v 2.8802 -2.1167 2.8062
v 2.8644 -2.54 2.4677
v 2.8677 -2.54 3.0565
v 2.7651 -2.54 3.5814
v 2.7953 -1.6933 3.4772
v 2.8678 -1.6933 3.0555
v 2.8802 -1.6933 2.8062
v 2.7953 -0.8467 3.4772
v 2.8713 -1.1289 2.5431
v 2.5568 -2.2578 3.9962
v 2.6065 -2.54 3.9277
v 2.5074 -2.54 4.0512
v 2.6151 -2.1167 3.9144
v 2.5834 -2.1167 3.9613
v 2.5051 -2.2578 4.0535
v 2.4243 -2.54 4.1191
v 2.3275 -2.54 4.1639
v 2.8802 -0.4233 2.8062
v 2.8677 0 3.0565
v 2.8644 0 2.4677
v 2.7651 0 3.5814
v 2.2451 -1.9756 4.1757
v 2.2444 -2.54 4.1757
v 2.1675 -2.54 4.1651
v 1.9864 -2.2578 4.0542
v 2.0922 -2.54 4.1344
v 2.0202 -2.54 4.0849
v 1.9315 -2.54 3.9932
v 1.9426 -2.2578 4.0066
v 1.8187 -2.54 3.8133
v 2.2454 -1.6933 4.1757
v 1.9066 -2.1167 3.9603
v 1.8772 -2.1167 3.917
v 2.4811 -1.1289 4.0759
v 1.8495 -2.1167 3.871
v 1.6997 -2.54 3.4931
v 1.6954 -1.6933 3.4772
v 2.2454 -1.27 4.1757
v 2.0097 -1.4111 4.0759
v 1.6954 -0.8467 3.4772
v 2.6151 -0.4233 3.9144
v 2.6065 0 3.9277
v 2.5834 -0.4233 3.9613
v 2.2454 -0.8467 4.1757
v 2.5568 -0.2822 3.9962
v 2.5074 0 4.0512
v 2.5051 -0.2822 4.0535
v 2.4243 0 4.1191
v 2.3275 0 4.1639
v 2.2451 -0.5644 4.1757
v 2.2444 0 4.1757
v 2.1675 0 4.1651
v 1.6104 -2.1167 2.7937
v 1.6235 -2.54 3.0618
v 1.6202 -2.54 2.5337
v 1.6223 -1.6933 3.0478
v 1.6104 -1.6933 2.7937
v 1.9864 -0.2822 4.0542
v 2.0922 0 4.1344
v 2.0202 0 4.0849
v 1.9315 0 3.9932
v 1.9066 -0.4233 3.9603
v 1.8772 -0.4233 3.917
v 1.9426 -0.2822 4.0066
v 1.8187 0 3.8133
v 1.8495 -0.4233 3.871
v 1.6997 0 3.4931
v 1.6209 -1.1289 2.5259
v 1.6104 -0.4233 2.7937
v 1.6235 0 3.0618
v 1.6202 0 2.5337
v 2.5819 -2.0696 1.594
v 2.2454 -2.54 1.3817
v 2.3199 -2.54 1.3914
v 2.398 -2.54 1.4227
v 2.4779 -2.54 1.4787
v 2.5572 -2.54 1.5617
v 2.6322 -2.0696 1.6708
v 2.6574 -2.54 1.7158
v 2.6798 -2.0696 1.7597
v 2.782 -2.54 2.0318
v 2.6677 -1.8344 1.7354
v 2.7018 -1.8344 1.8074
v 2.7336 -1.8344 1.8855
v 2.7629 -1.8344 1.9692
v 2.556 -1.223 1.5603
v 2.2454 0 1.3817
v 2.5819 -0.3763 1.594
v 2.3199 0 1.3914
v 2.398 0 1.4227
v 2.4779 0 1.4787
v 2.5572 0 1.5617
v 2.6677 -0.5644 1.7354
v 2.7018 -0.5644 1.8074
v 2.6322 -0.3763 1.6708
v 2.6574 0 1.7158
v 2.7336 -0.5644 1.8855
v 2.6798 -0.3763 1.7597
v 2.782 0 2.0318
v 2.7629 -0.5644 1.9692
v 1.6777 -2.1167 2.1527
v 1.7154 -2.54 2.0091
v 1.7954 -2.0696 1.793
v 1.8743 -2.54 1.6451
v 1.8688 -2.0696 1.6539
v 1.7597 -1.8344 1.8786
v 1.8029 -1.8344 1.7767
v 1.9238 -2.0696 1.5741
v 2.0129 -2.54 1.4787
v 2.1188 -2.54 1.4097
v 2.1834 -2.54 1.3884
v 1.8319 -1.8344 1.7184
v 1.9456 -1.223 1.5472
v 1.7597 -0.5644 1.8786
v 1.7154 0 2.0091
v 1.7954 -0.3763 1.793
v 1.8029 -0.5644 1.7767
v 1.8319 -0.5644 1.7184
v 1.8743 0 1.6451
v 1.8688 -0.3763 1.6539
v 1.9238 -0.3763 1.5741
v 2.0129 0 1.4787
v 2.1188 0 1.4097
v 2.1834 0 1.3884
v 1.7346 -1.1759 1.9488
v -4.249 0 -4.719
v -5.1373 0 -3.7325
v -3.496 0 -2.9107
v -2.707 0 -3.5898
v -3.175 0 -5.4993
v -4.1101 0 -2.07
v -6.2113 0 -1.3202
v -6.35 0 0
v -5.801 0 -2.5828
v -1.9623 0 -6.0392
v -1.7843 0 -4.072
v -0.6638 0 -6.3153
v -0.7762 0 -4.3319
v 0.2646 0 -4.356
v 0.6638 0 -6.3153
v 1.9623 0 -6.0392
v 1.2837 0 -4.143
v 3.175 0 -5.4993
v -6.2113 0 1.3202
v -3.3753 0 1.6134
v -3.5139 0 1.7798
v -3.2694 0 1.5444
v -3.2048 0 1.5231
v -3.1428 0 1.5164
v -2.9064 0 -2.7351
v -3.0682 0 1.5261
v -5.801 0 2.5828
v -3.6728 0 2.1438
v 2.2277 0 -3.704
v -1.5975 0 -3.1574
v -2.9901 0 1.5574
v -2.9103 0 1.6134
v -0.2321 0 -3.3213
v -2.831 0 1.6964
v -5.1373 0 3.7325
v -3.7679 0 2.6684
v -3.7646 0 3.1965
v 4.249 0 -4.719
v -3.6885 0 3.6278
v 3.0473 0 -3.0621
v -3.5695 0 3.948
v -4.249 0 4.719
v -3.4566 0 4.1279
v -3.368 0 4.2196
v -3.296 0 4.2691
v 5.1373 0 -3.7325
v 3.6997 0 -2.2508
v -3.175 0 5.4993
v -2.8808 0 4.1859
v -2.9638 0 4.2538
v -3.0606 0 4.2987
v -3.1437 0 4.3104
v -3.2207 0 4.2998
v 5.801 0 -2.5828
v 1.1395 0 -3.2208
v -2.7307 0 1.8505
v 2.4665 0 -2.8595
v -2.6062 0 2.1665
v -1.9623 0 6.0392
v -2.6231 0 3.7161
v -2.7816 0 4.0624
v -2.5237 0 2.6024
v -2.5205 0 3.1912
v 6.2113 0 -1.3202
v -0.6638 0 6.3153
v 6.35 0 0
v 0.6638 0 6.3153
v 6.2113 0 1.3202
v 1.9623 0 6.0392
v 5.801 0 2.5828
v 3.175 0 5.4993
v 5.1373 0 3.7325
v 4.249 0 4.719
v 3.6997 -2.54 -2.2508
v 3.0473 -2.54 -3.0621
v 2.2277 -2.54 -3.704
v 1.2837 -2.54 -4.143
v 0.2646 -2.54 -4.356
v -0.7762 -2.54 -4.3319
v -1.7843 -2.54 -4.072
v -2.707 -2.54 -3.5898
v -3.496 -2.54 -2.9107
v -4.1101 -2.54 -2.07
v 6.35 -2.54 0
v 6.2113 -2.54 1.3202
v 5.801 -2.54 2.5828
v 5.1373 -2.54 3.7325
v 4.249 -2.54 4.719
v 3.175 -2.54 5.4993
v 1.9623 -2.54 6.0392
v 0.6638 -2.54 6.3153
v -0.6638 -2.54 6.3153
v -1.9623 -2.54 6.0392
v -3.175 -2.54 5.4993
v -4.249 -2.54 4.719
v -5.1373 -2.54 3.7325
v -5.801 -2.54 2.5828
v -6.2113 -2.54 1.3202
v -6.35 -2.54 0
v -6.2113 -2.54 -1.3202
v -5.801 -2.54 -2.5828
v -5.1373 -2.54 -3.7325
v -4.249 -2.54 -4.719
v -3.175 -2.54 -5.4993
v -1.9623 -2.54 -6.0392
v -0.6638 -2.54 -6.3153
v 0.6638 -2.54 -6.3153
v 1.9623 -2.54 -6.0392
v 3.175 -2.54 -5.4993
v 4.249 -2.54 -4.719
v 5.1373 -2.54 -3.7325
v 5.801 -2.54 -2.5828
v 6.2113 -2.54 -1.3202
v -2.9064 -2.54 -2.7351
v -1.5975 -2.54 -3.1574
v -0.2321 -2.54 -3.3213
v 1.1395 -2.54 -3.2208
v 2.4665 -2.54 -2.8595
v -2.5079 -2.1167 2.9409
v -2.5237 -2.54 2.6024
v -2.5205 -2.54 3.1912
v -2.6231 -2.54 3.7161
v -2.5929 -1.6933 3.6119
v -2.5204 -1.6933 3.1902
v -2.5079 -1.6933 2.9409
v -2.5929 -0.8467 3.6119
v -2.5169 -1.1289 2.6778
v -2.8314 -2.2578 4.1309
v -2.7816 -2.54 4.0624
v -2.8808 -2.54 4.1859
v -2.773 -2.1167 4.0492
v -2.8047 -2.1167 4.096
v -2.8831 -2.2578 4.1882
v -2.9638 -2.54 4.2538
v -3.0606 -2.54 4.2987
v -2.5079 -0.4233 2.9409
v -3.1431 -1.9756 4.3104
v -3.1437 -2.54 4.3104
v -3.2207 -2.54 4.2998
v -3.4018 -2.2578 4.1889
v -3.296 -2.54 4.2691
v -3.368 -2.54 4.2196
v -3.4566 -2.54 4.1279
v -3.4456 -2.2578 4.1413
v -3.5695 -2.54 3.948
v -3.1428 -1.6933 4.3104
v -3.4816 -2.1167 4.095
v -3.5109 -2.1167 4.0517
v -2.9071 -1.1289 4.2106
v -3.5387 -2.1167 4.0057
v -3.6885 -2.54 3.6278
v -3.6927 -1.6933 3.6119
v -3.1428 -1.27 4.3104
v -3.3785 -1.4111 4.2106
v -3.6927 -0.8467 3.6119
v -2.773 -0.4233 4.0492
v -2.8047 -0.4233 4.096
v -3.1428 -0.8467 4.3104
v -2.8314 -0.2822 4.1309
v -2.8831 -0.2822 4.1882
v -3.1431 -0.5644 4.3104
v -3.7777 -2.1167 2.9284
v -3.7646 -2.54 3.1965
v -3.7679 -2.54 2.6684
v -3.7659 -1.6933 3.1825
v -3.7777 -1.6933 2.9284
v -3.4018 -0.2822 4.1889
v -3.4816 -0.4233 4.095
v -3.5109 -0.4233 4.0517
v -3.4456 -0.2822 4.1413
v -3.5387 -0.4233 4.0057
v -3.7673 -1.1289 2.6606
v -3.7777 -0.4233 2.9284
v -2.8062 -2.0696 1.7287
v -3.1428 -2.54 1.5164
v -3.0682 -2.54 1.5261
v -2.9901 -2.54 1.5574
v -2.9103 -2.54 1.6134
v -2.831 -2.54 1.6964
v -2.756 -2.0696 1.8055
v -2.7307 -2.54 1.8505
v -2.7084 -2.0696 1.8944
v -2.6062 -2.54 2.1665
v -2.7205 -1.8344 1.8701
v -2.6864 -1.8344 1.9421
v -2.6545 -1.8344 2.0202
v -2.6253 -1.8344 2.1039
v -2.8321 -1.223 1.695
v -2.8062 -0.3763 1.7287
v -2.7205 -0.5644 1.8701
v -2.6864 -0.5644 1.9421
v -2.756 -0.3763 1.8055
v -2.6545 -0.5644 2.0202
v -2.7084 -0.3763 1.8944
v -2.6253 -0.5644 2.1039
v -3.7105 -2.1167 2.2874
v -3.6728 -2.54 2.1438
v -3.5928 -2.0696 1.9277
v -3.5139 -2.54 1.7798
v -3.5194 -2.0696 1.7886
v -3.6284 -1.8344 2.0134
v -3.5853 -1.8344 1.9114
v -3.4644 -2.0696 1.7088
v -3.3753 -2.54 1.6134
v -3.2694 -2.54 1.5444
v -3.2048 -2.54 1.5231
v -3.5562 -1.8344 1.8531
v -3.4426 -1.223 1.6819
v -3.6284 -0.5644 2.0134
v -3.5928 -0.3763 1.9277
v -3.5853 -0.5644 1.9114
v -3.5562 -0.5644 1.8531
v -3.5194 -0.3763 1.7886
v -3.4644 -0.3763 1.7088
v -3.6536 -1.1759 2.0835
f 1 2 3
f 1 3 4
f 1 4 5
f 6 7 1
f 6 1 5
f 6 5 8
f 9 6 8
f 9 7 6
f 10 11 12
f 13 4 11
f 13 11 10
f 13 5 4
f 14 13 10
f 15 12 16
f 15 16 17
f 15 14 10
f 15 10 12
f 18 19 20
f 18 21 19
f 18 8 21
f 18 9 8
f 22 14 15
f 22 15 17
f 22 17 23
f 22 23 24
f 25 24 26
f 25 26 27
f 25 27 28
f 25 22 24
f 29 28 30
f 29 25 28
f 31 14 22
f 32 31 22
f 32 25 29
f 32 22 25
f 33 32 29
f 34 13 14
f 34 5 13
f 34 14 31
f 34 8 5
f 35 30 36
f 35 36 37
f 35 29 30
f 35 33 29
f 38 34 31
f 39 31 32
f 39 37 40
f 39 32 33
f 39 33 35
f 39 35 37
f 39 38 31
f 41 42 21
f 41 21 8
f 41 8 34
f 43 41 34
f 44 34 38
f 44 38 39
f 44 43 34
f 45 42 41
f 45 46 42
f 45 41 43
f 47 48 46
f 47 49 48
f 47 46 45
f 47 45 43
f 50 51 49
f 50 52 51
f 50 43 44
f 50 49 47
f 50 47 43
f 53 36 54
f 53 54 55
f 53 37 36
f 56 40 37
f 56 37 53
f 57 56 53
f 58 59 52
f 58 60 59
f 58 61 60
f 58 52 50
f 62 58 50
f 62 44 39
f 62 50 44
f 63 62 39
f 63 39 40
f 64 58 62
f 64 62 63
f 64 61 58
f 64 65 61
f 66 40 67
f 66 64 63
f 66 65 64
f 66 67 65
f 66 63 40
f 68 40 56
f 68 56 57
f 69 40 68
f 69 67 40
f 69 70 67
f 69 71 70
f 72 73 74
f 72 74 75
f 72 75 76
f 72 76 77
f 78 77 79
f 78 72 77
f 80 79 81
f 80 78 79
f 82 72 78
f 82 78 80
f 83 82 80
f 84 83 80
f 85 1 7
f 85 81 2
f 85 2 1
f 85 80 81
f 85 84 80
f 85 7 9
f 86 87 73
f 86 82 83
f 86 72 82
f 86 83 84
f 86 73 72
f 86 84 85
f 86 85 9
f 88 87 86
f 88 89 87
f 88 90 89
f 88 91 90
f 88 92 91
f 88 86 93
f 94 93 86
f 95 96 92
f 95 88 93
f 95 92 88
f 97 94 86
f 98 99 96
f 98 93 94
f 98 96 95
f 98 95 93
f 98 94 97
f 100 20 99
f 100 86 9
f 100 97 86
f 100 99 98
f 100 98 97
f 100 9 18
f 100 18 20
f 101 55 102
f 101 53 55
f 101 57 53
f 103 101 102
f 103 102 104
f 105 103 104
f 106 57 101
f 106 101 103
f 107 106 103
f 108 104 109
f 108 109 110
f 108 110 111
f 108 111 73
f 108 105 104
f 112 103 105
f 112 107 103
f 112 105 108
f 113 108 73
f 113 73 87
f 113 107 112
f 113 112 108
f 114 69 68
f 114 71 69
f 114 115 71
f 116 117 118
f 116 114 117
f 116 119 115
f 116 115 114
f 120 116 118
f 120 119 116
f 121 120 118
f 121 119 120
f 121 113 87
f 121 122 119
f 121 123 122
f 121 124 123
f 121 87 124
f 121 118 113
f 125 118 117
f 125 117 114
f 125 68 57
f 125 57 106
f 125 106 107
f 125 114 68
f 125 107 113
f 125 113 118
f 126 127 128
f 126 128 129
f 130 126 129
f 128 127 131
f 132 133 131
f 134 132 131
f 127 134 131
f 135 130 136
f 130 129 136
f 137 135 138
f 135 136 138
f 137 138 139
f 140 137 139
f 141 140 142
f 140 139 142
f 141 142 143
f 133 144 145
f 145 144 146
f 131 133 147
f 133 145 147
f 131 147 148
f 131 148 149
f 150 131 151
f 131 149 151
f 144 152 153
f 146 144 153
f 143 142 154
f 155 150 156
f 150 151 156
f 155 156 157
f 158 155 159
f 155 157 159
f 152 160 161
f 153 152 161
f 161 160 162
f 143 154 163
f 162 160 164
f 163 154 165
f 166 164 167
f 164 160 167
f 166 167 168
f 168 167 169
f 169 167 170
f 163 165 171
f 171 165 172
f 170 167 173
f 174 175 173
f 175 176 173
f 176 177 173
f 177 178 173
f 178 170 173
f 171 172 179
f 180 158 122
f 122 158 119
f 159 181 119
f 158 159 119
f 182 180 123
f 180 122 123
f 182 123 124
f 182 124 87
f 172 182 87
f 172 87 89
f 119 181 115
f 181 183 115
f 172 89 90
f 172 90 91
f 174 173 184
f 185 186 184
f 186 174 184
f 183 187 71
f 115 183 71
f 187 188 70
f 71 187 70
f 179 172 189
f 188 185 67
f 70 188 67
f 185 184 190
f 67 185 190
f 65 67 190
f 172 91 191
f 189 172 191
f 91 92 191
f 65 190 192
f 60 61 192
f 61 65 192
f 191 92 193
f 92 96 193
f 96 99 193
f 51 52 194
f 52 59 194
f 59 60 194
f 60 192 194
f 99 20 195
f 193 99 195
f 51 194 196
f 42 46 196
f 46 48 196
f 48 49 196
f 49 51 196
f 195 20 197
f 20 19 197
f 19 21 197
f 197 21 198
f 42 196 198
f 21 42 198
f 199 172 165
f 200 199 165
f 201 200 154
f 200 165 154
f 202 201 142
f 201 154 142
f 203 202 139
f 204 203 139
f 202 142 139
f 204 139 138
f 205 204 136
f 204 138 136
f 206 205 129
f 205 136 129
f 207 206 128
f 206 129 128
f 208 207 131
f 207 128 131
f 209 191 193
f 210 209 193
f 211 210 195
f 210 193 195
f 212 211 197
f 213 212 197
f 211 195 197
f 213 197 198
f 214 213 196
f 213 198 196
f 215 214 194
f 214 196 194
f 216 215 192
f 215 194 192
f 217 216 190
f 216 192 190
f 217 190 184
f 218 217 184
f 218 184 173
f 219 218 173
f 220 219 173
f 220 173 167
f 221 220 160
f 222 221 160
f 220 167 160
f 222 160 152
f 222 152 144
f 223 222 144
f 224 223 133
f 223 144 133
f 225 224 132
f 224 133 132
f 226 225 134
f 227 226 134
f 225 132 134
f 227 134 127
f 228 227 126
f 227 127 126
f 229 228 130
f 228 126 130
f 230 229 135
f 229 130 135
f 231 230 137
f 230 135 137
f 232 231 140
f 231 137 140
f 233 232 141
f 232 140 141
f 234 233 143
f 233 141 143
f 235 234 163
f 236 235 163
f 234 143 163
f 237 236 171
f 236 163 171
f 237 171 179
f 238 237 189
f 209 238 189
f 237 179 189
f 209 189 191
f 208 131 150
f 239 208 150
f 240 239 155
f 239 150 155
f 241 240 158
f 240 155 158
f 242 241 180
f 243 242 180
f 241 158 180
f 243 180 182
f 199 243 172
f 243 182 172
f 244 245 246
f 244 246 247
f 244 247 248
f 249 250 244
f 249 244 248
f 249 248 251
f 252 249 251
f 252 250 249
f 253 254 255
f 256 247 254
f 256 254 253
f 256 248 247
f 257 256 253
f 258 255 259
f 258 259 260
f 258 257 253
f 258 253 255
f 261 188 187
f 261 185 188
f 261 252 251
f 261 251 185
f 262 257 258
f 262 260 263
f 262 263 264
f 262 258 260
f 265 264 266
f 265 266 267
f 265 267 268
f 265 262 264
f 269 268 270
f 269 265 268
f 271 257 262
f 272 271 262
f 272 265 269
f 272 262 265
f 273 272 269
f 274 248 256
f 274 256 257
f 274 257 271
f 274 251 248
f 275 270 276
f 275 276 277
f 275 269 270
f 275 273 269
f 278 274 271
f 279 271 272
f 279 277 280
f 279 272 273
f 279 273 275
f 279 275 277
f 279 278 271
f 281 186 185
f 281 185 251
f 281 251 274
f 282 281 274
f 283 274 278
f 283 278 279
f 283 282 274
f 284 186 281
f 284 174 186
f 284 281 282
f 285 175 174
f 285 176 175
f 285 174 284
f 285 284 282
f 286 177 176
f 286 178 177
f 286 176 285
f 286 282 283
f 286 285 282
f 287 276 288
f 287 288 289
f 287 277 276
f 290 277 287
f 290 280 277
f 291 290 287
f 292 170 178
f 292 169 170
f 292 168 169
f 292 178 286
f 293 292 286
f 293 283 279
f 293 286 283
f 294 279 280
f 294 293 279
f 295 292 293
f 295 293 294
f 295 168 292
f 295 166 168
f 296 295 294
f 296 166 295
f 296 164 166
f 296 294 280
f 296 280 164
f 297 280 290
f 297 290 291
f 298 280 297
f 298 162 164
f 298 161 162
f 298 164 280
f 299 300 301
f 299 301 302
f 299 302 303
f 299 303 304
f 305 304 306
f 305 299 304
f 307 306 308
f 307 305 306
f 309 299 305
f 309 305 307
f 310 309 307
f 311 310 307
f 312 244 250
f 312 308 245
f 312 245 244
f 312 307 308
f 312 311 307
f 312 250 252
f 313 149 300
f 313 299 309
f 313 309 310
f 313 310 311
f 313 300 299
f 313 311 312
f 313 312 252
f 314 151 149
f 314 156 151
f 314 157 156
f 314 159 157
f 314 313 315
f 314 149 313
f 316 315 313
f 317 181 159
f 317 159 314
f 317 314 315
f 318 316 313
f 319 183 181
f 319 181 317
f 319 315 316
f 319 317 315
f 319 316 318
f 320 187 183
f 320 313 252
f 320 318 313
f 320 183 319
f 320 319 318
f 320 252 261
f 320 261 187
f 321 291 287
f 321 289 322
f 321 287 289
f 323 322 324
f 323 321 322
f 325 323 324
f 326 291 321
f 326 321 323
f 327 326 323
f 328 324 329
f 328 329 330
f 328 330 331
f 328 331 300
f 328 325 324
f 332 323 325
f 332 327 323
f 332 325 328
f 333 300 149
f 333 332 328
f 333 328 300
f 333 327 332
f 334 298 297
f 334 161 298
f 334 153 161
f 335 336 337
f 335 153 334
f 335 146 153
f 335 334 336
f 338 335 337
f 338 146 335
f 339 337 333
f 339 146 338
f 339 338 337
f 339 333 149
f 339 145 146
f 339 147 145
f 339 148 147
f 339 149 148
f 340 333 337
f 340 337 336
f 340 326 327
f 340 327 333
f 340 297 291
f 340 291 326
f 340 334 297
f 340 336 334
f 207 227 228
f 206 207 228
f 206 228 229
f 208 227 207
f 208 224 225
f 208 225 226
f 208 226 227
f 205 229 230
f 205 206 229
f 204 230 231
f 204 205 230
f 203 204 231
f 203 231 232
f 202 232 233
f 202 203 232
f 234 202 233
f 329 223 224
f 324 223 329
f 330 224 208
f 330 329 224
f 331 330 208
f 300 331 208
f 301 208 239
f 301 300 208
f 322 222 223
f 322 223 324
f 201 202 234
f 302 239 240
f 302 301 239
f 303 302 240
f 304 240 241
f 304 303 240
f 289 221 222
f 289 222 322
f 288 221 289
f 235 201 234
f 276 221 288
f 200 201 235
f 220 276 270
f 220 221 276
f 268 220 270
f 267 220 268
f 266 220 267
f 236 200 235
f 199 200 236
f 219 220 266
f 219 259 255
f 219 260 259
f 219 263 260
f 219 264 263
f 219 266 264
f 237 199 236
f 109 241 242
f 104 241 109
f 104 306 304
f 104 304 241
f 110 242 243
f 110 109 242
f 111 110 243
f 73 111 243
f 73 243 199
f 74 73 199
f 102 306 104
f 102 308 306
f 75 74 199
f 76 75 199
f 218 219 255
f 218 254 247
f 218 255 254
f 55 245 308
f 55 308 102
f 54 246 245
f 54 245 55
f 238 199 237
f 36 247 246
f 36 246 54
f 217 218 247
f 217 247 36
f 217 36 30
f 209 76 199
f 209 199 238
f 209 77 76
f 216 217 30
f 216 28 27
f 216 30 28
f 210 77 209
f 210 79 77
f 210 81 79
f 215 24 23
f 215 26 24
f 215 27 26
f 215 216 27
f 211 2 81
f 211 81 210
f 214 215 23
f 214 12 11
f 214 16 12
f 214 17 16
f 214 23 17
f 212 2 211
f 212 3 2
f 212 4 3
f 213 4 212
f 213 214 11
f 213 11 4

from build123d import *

# Parameters (mm, degrees)
F0_R     = 6.350037
F1_DEPTH = 2.54


with BuildPart() as f1:
    # F0 (on Front) → F1 (new body)
    with BuildSketch(Plane.XZ):
        Circle(F0_R)
        with BuildLine():
            ThreePointArc((3.6997, -2.250772), (-0.256442, -4.373777), (-4.110112, -2.069989))
            ThreePointArc((-4.110112, -2.069989), (-0.23208, -3.321333), (3.6997, -2.250772))
        make_face(mode=Mode.SUBTRACT)
        with BuildLine():
            add(Edge.make_bspline(
                [(-3.142784, 1.516398), (-2.042932, 1.516398), (-2.592858, 3.611898), (-3.142784, 5.707398), (-3.69271, 3.611898), (-4.242636, 1.516398), (-3.142784, 1.516398)],
                knots=[0, 0, 0, 2.094395, 2.094395, 4.18879, 4.18879, 6.283185, 6.283185, 6.283185], degree=2, weights=[1, 0.5, 1, 0.5, 1, 0.5, 1]))
        make_face(mode=Mode.SUBTRACT)
        with BuildLine():
            add(Edge.make_bspline(
                [(2.24537, 1.381694), (3.345222, 1.381694), (2.795296, 3.477194), (2.24537, 5.572694), (1.695444, 3.477194), (1.145518, 1.381694), (2.24537, 1.381694)],
                knots=[0, 0, 0, 2.094395, 2.094395, 4.18879, 4.18879, 6.283185, 6.283185, 6.283185], degree=2, weights=[1, 0.5, 1, 0.5, 1, 0.5, 1]))
        make_face(mode=Mode.SUBTRACT)
    extrude(amount=F1_DEPTH)


solid = f1.part
